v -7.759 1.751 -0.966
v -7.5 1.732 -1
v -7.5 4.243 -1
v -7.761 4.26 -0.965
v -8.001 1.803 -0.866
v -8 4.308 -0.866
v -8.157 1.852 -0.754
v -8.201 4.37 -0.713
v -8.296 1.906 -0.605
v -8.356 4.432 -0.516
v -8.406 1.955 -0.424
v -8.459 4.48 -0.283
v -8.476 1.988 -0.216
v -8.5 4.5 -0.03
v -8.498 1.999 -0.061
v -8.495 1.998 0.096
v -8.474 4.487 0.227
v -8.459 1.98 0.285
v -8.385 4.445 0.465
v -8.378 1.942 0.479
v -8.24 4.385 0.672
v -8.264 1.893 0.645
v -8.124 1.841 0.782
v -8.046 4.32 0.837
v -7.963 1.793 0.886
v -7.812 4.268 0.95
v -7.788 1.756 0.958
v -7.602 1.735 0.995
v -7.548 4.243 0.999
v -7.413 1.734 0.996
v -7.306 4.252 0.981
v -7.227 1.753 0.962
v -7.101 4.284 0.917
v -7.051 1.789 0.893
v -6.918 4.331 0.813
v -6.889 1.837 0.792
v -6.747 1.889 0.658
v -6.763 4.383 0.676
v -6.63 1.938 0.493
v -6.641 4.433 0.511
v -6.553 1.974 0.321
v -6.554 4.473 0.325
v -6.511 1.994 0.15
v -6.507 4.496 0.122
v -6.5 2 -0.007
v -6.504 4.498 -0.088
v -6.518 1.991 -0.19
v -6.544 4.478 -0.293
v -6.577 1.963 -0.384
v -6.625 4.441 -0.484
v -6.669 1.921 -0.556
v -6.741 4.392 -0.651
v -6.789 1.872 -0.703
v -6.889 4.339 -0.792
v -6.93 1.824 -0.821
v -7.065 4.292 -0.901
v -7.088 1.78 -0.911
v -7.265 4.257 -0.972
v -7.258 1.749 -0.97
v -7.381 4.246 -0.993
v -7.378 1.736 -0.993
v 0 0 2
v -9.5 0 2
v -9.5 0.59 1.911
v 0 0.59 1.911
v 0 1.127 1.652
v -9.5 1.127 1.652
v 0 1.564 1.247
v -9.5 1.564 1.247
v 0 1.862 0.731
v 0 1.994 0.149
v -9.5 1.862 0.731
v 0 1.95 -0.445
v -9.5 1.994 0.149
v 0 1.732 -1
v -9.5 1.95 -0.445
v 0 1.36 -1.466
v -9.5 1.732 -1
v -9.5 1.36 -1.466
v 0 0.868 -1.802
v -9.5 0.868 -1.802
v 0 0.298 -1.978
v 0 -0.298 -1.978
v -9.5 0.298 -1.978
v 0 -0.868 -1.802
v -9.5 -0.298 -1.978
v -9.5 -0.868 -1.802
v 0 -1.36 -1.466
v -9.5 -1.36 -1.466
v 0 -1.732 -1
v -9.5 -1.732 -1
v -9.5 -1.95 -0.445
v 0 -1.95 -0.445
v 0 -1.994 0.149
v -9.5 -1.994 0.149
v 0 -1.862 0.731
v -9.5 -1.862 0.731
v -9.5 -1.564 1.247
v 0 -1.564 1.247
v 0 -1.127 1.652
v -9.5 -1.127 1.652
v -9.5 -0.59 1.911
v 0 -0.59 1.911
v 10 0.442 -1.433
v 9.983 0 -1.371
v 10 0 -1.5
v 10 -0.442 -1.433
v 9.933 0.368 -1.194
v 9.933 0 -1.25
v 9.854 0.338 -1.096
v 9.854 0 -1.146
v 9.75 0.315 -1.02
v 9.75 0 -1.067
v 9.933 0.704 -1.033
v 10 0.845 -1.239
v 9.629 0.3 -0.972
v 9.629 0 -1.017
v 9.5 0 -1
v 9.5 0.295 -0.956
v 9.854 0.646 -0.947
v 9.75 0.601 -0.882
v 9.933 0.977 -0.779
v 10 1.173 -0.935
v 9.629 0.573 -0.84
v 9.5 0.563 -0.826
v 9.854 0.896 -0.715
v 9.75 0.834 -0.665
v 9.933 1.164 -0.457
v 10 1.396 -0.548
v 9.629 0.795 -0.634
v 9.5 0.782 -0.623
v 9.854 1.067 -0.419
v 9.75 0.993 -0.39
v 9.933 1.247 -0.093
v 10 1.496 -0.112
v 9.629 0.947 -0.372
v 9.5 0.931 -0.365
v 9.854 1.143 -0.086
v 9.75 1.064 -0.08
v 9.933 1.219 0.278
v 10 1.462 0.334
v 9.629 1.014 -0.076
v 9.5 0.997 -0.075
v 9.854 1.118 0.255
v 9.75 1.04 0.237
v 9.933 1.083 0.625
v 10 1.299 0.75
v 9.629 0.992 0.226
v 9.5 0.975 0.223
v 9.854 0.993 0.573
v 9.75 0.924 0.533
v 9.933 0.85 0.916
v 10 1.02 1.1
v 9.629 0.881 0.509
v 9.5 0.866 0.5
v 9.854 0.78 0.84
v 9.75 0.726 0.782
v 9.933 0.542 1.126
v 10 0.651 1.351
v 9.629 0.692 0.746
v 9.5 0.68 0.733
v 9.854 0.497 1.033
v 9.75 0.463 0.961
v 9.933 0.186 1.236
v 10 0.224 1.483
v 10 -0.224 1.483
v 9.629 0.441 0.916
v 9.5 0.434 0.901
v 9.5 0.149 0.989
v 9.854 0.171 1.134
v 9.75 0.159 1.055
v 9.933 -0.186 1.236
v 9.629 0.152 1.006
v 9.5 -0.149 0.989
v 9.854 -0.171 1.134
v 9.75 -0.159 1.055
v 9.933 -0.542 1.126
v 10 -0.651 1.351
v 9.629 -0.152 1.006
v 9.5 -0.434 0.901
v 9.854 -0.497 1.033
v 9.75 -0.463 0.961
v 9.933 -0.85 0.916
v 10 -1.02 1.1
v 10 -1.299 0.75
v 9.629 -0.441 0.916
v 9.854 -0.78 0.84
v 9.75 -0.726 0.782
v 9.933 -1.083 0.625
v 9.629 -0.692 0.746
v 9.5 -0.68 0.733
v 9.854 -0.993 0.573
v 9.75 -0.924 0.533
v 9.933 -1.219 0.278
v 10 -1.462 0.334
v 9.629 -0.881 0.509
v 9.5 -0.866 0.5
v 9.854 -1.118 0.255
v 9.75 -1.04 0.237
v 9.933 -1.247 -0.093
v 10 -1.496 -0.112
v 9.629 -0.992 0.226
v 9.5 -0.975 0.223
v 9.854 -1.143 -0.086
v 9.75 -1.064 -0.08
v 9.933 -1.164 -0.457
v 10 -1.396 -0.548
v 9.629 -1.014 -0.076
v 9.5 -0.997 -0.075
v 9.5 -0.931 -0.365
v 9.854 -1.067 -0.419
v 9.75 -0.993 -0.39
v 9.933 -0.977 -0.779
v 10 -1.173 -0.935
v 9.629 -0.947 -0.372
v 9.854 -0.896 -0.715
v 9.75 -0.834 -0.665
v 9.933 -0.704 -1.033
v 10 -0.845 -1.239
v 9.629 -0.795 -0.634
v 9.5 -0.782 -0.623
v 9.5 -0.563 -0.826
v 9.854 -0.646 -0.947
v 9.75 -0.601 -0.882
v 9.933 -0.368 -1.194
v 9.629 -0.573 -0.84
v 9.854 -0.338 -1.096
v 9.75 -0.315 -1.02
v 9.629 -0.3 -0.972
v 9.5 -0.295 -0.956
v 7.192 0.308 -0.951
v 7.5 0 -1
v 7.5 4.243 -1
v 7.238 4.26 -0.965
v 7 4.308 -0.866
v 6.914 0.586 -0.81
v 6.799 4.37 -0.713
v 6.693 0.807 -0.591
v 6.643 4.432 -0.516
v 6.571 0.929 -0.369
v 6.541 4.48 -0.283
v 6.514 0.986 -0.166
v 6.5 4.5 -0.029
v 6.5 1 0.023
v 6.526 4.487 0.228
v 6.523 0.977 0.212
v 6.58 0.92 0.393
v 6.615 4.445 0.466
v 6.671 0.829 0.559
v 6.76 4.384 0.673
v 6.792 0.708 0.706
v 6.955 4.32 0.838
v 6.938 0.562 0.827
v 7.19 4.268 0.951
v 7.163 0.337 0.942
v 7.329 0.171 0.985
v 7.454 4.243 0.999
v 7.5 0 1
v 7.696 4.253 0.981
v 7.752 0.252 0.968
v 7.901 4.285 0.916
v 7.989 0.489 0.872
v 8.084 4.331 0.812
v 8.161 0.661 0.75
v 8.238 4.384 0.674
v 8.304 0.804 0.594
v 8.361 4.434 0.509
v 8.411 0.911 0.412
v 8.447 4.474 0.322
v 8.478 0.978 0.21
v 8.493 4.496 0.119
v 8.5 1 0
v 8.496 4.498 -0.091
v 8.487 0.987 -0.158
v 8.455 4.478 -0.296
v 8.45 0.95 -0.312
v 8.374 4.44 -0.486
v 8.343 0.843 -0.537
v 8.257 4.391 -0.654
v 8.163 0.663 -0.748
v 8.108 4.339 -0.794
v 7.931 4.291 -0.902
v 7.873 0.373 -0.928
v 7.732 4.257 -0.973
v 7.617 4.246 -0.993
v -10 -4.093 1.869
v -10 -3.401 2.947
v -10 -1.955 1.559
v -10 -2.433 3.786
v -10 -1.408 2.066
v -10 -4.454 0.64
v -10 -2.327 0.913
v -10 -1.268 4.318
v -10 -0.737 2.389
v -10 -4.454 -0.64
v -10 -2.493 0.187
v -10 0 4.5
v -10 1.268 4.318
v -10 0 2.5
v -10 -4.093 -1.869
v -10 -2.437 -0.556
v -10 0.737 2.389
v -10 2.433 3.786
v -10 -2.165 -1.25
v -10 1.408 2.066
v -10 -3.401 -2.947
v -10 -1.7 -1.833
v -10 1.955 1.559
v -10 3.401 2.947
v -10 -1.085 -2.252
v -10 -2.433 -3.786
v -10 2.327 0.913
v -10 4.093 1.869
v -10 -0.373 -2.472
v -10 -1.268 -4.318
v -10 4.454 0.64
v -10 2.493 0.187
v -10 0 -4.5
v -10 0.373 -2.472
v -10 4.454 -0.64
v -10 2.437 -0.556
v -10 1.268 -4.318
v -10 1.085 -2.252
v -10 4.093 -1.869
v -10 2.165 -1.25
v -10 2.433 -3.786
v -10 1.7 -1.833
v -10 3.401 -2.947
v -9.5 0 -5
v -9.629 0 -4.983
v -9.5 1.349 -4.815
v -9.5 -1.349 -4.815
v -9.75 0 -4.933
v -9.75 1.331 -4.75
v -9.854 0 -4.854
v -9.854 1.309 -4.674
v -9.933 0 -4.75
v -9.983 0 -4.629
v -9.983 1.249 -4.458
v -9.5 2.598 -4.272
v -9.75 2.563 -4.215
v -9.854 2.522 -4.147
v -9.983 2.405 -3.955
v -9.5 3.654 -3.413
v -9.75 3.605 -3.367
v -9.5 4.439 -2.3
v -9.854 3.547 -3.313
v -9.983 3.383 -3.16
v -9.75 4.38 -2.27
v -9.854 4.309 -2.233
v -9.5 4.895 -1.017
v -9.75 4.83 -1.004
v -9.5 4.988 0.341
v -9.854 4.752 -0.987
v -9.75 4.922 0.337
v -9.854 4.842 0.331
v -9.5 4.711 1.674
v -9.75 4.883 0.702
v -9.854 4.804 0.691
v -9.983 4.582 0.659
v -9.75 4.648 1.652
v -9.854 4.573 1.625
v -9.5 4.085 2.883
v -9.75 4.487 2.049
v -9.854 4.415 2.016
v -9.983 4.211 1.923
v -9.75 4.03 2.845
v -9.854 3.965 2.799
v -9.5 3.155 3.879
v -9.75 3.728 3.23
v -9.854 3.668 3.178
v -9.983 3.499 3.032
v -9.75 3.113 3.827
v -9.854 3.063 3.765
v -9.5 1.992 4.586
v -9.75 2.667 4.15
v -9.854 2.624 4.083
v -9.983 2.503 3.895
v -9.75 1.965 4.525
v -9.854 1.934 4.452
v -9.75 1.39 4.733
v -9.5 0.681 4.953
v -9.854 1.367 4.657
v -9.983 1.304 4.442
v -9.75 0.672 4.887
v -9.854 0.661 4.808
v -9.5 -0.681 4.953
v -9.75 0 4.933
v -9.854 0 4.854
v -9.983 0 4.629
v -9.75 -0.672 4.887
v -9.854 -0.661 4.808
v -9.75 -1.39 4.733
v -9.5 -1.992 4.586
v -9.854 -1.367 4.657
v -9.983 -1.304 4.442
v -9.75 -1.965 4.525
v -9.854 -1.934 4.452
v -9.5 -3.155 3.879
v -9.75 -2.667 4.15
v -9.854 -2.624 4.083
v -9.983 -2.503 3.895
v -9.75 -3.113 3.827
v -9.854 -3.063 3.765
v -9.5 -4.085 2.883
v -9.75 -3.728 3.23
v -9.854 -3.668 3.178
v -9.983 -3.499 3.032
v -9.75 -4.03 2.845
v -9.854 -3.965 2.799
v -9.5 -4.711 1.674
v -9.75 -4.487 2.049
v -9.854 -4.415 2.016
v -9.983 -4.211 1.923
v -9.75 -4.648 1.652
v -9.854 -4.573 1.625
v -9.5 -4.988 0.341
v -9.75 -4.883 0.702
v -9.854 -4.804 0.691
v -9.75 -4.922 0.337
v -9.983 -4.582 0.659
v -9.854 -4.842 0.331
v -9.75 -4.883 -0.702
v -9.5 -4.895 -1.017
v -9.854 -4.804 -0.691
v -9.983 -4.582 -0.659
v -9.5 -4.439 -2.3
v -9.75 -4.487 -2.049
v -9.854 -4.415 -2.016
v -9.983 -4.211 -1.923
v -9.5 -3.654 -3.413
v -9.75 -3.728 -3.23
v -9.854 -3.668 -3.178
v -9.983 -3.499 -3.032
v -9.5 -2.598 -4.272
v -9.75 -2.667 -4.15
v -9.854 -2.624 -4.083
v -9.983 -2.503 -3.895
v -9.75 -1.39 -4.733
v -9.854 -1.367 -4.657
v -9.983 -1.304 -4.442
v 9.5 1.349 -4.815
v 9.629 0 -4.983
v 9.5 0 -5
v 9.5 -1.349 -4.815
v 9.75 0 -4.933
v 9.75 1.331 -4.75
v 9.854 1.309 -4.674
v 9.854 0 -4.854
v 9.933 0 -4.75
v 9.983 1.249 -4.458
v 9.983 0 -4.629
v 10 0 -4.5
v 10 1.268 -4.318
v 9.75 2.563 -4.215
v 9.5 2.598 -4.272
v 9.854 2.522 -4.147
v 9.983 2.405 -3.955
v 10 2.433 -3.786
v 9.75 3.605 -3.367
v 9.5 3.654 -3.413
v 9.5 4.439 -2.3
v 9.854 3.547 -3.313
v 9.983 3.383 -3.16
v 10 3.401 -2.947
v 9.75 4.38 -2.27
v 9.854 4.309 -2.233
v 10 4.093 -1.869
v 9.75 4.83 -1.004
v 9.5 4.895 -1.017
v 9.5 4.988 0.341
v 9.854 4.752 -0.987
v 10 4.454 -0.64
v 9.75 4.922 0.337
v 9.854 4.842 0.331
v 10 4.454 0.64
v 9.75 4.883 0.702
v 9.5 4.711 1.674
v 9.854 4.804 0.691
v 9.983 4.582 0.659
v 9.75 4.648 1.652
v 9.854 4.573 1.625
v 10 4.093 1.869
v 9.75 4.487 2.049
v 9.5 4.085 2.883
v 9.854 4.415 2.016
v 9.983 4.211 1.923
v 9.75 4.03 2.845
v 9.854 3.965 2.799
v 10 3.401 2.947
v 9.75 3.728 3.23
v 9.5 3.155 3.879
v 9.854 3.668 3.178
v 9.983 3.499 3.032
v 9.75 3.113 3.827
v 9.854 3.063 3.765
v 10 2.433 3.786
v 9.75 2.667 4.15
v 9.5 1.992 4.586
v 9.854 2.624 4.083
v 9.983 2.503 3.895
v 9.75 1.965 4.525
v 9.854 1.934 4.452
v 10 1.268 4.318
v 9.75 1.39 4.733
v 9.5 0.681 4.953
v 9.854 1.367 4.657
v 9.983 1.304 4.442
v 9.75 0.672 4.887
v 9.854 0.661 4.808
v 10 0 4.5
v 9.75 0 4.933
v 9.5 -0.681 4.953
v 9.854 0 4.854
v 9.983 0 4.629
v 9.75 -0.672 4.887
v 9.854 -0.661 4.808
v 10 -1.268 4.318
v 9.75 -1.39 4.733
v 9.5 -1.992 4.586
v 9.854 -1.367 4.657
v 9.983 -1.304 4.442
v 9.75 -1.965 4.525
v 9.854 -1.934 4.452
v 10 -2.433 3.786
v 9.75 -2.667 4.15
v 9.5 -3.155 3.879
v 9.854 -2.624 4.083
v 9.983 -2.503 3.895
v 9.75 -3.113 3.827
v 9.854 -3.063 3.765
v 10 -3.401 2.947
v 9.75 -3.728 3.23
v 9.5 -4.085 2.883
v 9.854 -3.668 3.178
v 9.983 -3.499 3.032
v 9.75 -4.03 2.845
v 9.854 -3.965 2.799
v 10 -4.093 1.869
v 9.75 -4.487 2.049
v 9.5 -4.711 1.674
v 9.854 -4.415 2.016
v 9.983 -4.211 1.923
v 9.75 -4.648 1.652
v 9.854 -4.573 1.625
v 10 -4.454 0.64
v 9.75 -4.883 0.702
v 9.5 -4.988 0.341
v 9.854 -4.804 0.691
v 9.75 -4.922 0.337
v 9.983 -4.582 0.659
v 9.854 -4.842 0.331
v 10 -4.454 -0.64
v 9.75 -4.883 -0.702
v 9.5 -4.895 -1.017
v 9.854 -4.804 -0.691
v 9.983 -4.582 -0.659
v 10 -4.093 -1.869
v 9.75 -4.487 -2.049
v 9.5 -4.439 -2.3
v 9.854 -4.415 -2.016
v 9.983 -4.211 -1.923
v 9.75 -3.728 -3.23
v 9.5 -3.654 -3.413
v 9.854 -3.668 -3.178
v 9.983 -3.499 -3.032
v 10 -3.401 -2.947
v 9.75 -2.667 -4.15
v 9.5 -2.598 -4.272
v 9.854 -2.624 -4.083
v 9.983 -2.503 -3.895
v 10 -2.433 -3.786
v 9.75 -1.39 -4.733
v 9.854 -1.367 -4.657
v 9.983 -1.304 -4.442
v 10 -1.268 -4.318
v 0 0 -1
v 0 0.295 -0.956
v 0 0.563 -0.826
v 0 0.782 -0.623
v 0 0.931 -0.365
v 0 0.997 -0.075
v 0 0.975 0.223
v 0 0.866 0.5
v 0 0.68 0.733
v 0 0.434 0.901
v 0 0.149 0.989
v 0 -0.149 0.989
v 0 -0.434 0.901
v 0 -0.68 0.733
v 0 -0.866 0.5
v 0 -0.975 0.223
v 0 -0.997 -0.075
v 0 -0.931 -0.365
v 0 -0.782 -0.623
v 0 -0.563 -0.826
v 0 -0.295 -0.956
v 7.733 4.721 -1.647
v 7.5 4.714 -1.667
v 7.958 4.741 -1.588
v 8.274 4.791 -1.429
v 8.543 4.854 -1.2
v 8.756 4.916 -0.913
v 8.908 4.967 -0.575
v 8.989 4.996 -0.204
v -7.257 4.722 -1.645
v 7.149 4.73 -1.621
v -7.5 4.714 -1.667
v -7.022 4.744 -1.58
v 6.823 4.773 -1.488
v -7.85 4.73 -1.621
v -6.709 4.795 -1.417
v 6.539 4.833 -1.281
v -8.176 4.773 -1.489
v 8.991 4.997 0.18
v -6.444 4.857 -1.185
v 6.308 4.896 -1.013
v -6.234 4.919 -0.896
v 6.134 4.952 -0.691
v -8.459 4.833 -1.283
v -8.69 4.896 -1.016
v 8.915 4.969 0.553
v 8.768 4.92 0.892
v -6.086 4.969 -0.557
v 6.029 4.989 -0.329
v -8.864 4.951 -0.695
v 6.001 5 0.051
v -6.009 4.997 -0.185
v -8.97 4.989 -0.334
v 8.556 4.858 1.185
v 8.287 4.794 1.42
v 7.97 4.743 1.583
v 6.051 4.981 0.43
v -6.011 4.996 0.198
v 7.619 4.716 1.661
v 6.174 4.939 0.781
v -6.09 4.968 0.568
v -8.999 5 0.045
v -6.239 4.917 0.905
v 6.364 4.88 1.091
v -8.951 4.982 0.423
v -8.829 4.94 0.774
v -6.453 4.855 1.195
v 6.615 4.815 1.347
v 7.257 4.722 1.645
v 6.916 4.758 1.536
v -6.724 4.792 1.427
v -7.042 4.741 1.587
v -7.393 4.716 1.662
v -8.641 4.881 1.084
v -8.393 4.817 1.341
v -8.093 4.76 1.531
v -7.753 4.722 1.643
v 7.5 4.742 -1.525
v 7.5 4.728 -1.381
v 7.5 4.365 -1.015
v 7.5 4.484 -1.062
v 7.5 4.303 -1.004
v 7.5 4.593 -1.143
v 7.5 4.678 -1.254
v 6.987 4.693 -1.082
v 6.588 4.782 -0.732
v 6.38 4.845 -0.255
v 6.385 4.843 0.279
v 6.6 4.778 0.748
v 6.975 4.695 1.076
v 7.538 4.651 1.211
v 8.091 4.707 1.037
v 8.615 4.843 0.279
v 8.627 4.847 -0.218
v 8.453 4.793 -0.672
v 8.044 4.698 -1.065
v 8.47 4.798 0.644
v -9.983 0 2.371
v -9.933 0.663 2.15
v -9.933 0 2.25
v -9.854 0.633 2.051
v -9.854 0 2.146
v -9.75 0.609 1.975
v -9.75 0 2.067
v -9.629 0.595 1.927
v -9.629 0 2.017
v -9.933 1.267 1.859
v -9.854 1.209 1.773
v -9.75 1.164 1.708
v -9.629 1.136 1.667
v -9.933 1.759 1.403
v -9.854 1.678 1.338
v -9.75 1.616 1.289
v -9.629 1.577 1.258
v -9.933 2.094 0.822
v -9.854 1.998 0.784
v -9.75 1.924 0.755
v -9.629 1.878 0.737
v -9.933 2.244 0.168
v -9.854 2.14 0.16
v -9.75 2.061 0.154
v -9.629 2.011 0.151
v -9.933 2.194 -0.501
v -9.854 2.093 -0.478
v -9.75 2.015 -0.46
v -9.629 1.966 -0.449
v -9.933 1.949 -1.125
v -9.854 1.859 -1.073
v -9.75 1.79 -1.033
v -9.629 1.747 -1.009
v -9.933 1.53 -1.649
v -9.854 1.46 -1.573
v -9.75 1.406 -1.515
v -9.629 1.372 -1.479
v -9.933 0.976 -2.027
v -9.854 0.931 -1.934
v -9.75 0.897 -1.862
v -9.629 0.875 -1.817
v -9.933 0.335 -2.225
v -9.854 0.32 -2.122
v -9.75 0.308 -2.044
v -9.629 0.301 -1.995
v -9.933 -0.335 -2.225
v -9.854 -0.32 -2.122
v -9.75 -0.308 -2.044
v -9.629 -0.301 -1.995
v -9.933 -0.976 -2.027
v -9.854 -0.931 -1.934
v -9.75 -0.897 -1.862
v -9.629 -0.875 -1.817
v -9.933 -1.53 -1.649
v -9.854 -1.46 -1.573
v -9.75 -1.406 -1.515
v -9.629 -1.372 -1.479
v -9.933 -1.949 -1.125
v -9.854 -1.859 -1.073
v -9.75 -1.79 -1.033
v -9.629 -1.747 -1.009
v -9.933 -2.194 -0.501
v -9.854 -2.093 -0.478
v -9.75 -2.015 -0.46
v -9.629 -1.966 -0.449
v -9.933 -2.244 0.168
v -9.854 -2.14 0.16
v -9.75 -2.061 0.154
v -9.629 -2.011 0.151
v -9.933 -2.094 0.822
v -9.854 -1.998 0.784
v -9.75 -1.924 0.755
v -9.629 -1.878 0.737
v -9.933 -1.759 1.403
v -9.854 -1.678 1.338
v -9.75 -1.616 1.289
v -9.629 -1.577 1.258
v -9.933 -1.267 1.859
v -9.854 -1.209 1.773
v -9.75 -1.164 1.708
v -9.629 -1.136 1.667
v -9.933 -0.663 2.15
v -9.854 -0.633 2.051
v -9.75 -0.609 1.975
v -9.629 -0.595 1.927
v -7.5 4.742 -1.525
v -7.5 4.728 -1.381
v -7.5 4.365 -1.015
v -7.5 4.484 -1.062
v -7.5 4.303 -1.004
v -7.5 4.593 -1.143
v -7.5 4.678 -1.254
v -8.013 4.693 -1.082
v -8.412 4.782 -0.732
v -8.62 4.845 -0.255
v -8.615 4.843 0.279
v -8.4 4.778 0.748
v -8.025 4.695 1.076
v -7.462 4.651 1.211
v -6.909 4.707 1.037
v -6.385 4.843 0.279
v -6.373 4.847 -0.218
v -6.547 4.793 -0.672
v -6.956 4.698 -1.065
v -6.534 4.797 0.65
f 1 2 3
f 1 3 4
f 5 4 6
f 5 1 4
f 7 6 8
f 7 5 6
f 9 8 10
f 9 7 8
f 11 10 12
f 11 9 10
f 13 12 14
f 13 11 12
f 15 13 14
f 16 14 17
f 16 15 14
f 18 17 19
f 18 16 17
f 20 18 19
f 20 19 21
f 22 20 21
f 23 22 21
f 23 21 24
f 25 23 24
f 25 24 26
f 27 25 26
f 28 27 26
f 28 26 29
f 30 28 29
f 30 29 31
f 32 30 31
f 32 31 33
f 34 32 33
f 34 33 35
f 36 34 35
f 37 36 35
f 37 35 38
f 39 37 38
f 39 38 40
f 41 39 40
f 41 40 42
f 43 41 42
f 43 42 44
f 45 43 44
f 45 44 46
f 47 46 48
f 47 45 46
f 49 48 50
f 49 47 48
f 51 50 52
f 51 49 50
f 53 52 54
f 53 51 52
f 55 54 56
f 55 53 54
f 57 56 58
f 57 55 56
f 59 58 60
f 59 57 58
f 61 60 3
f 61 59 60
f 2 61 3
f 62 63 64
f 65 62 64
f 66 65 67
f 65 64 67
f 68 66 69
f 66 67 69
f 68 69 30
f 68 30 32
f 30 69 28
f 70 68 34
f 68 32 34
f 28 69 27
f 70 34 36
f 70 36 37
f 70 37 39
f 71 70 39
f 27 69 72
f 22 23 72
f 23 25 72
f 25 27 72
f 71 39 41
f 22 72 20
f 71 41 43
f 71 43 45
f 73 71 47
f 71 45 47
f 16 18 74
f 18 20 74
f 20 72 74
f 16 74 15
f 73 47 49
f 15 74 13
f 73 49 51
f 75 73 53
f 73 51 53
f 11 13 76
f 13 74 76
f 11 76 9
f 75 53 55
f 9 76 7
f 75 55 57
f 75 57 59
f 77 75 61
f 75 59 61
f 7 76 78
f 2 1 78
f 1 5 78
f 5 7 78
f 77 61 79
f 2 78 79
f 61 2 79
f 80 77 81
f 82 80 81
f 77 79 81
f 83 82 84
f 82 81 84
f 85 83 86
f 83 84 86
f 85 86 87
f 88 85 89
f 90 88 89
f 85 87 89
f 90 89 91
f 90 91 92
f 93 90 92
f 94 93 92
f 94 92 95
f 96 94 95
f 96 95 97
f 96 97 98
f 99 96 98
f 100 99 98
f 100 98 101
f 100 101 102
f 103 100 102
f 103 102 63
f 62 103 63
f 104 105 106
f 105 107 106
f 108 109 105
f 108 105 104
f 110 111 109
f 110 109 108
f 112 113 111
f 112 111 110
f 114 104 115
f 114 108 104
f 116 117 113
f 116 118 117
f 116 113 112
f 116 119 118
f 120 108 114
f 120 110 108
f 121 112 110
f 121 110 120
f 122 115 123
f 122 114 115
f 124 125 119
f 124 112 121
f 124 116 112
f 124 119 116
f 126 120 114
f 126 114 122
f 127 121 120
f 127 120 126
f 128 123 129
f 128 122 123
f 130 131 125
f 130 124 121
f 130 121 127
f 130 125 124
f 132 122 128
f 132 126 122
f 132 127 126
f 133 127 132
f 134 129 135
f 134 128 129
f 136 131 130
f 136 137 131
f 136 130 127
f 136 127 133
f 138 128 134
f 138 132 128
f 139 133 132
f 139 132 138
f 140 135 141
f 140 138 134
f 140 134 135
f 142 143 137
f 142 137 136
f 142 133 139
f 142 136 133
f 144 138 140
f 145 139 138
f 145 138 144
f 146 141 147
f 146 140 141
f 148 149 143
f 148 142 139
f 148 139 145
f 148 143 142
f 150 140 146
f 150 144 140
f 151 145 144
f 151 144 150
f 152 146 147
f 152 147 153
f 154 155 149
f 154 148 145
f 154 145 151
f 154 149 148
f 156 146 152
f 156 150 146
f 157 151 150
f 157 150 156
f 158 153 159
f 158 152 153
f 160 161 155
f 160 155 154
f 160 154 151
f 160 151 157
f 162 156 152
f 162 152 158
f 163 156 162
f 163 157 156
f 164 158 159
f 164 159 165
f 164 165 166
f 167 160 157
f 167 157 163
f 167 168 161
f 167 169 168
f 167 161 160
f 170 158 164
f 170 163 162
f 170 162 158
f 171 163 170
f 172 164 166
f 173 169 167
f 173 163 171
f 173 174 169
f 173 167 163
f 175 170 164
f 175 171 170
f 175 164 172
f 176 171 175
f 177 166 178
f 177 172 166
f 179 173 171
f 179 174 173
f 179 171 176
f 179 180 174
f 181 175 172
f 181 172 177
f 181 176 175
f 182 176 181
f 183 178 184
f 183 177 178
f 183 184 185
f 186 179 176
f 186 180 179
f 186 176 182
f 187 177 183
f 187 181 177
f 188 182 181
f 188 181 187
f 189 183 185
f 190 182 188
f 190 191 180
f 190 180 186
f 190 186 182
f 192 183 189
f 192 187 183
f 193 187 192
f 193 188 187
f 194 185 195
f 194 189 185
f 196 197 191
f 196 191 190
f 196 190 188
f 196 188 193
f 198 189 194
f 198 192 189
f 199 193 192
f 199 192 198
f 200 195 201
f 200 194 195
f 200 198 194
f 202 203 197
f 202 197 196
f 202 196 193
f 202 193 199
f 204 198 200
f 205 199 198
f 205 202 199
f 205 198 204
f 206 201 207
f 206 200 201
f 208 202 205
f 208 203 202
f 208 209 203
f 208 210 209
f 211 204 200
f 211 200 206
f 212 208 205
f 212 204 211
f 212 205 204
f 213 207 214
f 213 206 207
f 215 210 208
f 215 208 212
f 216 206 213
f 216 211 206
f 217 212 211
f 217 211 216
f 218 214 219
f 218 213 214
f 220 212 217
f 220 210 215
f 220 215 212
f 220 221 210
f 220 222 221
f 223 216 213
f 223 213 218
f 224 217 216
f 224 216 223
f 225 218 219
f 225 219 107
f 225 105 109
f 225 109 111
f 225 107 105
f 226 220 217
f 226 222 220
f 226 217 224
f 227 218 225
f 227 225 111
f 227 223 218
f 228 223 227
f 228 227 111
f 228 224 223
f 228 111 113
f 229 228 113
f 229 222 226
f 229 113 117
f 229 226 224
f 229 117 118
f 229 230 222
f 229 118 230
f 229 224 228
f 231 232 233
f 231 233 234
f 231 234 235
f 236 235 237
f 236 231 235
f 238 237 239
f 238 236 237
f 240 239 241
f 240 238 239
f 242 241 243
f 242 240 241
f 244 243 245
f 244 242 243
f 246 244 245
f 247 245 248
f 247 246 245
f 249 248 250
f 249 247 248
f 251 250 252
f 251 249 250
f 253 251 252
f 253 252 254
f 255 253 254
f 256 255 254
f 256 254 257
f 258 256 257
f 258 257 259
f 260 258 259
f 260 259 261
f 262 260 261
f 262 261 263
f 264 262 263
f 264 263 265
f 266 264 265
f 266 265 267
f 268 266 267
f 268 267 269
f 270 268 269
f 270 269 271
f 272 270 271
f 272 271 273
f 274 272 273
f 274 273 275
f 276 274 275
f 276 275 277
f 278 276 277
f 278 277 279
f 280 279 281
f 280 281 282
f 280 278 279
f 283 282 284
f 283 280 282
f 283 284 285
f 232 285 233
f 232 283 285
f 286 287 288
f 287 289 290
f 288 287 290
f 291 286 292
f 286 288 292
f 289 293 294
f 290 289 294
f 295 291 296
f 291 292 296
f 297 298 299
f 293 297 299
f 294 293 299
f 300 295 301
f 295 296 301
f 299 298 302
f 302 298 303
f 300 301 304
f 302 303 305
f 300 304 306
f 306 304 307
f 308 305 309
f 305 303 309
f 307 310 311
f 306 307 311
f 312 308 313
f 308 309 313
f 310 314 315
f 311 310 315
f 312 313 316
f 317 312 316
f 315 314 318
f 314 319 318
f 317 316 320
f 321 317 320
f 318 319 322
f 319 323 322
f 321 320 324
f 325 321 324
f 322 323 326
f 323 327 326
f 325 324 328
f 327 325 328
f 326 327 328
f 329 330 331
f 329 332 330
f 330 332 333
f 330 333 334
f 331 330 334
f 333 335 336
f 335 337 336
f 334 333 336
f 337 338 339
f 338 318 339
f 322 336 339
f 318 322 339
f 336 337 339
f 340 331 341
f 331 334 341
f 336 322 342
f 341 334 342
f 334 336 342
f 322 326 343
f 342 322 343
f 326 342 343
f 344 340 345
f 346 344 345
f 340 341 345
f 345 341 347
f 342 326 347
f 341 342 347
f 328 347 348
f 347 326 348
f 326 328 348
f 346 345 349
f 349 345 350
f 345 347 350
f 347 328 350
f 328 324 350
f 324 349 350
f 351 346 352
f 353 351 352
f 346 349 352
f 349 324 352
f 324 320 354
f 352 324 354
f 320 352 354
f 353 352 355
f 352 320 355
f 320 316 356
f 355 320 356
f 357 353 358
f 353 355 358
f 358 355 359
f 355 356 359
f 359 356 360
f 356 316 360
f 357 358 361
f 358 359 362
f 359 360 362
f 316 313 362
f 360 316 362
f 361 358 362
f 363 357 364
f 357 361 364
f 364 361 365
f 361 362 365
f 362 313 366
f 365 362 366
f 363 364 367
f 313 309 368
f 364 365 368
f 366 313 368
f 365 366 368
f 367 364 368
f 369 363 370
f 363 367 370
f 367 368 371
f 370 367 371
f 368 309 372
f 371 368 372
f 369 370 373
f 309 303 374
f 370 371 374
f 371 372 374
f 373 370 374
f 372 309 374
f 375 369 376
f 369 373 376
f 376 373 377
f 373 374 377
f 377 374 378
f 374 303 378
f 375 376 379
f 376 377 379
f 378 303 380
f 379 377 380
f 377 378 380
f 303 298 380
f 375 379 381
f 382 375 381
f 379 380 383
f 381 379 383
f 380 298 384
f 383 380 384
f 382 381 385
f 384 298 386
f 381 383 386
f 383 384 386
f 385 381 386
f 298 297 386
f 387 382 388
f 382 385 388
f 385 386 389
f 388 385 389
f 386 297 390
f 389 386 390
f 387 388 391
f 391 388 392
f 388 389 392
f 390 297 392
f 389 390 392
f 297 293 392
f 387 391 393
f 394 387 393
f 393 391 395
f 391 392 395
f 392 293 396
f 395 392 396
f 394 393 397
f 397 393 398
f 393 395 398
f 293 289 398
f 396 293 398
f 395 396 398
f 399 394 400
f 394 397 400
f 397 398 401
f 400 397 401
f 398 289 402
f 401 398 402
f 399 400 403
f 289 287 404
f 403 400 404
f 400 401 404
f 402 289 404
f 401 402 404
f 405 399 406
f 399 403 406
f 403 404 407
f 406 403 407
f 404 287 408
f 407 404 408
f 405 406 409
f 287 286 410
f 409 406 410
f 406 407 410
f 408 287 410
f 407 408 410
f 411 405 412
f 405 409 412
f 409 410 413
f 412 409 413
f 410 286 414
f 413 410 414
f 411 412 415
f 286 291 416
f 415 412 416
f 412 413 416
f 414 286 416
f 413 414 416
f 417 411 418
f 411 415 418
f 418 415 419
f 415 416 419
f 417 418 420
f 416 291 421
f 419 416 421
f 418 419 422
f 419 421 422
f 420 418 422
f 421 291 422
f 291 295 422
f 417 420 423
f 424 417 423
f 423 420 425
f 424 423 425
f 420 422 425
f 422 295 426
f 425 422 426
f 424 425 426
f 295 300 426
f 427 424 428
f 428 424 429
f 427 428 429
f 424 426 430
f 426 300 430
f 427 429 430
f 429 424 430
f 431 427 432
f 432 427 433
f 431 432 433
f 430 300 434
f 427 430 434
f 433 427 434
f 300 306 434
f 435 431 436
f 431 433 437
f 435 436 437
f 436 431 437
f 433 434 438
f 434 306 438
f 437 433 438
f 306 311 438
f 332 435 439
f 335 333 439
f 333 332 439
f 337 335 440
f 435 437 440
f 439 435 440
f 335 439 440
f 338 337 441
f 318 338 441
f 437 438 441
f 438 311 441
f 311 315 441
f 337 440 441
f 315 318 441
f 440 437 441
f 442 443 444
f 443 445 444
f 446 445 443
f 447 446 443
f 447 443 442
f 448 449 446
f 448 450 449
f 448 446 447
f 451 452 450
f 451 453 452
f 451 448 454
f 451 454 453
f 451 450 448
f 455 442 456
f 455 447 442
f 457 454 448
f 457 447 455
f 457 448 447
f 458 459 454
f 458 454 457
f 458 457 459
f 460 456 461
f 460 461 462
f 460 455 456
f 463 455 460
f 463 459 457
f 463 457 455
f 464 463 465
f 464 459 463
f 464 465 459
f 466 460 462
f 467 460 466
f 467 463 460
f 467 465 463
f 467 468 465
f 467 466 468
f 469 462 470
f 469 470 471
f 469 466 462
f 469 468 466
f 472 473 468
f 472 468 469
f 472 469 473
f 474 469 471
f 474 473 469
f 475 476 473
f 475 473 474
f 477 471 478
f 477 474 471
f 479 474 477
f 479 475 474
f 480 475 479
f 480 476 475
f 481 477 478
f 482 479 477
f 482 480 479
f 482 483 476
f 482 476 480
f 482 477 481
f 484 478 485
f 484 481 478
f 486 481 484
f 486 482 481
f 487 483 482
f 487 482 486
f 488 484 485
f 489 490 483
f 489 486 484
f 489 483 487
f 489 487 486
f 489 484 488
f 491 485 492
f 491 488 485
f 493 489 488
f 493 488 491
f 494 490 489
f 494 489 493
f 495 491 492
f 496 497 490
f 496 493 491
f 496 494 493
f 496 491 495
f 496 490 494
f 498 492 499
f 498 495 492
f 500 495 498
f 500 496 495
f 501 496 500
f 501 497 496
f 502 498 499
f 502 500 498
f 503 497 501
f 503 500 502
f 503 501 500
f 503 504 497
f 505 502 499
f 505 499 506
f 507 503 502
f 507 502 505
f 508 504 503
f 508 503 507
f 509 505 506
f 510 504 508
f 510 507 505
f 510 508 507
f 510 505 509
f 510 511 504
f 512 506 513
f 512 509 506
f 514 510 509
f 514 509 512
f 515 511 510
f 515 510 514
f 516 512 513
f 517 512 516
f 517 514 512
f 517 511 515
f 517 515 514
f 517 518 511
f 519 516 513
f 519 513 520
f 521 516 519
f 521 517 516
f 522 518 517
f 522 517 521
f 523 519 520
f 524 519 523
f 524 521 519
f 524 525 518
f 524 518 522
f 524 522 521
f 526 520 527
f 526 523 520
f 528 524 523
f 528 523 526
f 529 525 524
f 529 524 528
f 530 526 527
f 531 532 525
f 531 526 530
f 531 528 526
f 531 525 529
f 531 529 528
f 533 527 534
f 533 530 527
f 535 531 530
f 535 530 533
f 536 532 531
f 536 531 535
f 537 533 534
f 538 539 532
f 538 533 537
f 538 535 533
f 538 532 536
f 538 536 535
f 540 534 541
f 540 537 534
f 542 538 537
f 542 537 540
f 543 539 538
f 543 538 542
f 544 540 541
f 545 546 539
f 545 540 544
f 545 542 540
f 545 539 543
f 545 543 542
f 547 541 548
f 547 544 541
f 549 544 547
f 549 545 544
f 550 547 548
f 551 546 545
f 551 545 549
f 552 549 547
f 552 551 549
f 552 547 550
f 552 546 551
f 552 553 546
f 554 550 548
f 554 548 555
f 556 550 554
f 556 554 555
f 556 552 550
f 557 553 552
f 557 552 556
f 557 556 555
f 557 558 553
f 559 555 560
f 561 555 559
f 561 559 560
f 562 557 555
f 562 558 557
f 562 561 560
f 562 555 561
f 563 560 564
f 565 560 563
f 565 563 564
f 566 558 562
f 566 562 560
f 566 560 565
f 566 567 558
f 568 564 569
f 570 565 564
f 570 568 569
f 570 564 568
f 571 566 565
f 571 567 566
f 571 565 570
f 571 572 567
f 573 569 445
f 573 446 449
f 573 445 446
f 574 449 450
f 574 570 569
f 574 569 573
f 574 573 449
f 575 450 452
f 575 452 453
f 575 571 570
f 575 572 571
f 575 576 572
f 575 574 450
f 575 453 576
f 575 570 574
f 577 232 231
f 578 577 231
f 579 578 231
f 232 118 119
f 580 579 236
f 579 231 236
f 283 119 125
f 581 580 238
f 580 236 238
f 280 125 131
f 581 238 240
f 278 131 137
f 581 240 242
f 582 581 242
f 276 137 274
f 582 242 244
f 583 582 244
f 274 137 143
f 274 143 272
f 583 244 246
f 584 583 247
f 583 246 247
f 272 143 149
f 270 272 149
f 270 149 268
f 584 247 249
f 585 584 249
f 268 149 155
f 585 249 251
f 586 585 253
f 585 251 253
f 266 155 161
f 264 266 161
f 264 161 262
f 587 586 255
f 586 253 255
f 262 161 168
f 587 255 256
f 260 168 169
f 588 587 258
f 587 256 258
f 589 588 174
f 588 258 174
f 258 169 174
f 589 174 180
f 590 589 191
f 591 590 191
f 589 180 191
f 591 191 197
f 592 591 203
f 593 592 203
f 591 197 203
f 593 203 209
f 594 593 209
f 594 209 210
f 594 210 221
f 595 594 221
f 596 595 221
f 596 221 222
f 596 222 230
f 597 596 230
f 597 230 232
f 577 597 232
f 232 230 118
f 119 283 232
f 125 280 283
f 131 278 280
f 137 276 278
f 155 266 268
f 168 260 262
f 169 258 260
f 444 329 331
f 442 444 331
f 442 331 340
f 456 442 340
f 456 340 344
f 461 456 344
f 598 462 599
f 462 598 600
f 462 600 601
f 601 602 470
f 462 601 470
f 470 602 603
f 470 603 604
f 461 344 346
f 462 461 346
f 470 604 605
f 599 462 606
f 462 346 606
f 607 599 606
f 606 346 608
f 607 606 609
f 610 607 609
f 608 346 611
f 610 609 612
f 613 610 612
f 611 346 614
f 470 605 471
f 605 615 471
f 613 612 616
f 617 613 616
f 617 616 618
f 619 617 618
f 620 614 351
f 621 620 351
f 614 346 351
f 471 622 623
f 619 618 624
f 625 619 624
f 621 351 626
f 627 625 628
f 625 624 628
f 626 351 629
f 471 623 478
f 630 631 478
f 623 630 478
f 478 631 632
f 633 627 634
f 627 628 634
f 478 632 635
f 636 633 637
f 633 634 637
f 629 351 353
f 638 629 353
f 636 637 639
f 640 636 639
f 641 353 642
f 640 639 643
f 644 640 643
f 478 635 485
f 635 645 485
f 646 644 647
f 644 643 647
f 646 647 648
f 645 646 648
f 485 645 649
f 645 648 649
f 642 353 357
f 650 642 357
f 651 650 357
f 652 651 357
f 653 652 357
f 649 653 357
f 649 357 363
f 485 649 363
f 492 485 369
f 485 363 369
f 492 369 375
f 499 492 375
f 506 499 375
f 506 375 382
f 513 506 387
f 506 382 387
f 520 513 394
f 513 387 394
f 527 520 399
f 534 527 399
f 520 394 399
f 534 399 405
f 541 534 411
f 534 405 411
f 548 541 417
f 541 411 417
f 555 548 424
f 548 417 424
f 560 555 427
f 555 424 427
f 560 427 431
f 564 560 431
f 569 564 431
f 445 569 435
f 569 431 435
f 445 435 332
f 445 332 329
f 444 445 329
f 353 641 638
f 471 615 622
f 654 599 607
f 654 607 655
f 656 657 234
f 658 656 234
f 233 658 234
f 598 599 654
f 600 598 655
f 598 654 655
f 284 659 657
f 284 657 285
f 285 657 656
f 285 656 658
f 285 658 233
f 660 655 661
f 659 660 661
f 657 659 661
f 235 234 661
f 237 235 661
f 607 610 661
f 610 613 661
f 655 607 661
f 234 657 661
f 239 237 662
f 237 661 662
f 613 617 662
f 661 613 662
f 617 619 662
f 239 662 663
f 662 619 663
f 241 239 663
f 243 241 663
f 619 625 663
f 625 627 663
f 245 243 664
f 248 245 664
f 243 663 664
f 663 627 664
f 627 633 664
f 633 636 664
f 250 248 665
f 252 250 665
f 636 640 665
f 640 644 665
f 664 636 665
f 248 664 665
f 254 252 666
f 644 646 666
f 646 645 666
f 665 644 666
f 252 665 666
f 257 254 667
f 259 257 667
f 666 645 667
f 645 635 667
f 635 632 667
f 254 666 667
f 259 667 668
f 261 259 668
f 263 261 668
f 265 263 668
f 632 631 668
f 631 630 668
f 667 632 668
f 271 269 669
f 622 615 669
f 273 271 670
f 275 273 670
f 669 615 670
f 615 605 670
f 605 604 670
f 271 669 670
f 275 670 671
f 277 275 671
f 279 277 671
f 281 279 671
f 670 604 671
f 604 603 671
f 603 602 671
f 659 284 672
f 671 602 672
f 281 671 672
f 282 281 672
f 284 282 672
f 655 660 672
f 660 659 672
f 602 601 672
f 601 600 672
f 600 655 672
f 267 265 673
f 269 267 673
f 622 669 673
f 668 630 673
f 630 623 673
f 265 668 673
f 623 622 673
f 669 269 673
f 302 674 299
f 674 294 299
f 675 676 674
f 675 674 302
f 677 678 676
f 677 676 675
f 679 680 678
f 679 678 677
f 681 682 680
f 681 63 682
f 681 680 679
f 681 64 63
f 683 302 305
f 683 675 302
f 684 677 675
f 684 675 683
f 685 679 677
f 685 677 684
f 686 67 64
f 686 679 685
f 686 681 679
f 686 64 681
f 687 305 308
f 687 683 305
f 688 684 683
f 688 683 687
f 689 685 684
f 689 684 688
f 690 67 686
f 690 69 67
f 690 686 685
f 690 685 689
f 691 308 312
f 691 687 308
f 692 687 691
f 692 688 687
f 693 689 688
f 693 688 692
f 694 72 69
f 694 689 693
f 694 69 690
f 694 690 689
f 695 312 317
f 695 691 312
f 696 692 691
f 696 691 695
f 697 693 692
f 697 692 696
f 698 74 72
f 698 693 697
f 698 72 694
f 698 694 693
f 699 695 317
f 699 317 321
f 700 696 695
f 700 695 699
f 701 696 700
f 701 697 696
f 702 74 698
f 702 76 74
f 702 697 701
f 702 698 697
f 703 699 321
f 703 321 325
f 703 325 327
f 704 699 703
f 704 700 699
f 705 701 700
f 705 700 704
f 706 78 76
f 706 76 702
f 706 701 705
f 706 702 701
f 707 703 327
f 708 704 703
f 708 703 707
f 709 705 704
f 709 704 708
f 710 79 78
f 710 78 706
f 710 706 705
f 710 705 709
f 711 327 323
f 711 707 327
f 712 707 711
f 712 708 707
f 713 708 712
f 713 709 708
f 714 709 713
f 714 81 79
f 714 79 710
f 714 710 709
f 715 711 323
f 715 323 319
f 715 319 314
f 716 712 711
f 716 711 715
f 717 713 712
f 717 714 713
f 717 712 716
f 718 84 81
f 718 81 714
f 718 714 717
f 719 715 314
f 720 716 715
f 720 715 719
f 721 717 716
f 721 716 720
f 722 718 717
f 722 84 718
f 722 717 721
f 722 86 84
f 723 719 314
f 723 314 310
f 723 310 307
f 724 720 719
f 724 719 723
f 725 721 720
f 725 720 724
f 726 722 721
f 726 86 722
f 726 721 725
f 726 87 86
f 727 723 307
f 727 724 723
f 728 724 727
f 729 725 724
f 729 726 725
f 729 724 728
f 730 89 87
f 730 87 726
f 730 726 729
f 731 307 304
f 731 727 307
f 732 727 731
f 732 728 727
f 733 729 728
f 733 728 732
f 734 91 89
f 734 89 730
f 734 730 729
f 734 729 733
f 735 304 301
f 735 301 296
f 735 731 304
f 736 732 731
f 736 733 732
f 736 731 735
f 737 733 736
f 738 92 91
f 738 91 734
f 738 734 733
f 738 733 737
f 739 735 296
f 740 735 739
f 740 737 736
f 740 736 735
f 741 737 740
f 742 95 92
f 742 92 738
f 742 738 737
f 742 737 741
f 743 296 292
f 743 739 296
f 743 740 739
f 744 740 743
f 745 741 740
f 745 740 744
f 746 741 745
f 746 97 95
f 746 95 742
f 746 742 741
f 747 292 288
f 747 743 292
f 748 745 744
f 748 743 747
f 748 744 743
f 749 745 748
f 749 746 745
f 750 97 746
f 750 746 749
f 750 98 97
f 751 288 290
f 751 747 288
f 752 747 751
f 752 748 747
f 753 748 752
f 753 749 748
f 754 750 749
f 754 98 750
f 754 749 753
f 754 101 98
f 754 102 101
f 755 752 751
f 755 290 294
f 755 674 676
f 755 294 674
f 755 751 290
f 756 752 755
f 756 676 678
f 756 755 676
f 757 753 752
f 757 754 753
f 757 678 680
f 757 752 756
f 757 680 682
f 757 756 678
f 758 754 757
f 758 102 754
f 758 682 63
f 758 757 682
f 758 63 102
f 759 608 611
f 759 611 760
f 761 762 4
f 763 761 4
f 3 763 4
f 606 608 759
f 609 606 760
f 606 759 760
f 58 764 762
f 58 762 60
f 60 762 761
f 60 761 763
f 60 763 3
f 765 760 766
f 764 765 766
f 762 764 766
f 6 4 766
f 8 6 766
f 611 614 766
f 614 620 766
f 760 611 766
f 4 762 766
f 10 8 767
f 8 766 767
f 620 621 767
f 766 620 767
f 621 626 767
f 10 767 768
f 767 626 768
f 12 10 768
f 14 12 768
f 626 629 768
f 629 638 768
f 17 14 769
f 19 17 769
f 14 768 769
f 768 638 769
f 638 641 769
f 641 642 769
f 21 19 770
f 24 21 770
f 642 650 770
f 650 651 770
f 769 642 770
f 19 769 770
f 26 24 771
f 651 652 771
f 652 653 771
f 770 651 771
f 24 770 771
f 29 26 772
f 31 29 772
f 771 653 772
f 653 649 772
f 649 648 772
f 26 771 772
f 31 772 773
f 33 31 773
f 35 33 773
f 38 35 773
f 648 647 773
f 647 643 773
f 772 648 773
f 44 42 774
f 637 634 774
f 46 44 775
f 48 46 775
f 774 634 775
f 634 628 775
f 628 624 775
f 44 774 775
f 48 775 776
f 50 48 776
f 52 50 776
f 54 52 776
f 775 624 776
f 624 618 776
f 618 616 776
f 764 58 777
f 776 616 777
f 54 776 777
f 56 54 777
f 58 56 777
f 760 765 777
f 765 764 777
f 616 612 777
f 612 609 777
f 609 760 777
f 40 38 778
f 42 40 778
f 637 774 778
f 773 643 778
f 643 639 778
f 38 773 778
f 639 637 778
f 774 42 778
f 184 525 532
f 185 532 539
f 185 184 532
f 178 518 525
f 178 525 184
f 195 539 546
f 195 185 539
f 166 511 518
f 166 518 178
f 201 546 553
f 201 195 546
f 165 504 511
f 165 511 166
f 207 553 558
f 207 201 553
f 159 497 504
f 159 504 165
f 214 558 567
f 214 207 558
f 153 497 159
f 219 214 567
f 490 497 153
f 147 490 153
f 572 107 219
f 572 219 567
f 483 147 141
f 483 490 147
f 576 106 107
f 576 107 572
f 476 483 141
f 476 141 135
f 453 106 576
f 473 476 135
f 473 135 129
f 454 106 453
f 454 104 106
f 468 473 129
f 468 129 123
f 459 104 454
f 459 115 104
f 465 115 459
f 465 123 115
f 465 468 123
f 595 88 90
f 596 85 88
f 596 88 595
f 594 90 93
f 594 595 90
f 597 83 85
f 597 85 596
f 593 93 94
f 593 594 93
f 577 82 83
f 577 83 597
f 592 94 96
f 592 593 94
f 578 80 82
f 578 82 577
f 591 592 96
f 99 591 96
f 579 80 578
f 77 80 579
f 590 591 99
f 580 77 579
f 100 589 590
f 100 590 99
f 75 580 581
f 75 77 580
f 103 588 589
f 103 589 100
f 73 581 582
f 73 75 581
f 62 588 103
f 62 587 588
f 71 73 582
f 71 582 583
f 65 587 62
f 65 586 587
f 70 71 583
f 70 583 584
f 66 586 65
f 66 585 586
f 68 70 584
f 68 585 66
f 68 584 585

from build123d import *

# Parameters (mm, degrees)
BOSS_EXTRUDE1_DEPTH      = 10
BOSS_EXTRUDE1_DEPTH_BACK = 10
SKETCH1_R                = 5
SKETCH2_R                = 1
CUT_EXTRUDE1_DEPTH       = 10
SKETCH3_R                = 2
CUT_EXTRUDE2_DEPTH       = 10
CUT_EXTRUDE4_REACH       = 14.247
CUT_EXTRUDE4_END_RADIUS  = 5
SKETCH4_R                = 1
FILLET1_R                = 0.5
FILLET2_R                = 0.5


with BuildPart() as part:
    # Sketch1 → Boss-Extrude1 (new, two sides: drawn at the far end of the back side and taken through both)
    with BuildSketch(Plane(origin=(0, 0, 0), x_dir=(0, 0, -1), z_dir=(1, 0, 0)).offset(-BOSS_EXTRUDE1_DEPTH_BACK)):
        Circle(SKETCH1_R)
    extrude(amount=BOSS_EXTRUDE1_DEPTH + BOSS_EXTRUDE1_DEPTH_BACK)

    # Sketch2 → Cut-Extrude1 (cut)
    with BuildSketch(Plane(origin=(10, 0, 0), x_dir=(0, 0, -1), z_dir=(1, 0, 0))):
        Circle(SKETCH2_R)
    extrude(amount=-CUT_EXTRUDE1_DEPTH, mode=Mode.SUBTRACT)

    # Sketch3 → Cut-Extrude2 (cut)
    with BuildSketch(Plane.ZY.offset(10)):
        Circle(SKETCH3_R)
    extrude(amount=-CUT_EXTRUDE2_DEPTH, mode=Mode.SUBTRACT)

    # Cut-Extrude4: up to this cylinder (the profile starts inside it)
    cut_extrude4_end = Plane(origin=(0, 0, 0), z_dir=(1, 0, 0)) * Cylinder(CUT_EXTRUDE4_END_RADIUS, 54.494, mode=Mode.PRIVATE)
    # Sketch4 → Cut-Extrude4 (cut, up to the surface)
    with BuildSketch(Plane(origin=(0, 0, 0), x_dir=(1, 0, 0), z_dir=(0, 1, 0)), mode=Mode.PRIVATE) as cut_extrude4_sk1:
        with Locations(Location((-7.5, 0, 0), (0, 0, 90))):
            Circle(SKETCH4_R)
    cut_extrude4_tool1 = extrude(cut_extrude4_sk1.sketch, amount=CUT_EXTRUDE4_REACH, mode=Mode.PRIVATE) & cut_extrude4_end
    add(cut_extrude4_tool1.solids().sort_by_distance((-7.5, 0, 0))[0], mode=Mode.SUBTRACT)
    # Sketch4 → Cut-Extrude4 (cut, up to the surface)
    with BuildSketch(Plane(origin=(0, 0, 0), x_dir=(1, 0, 0), z_dir=(0, 1, 0)), mode=Mode.PRIVATE) as cut_extrude4_sk2:
        with Locations(Location((7.5, 0, 0), (0, 0, 90))):
            Circle(SKETCH4_R)
    cut_extrude4_tool2 = extrude(cut_extrude4_sk2.sketch, amount=CUT_EXTRUDE4_REACH, mode=Mode.PRIVATE) & cut_extrude4_end
    add(cut_extrude4_tool2.solids().sort_by_distance((7.5, 0, 0))[0], mode=Mode.SUBTRACT)

    # Fillet1
    fillet1_edges = [part.edges().sort_by_distance(p)[0] for p in [
        (-10, 0, -2),
        (-10, 0, 5),
        (10, 0, 5),
        (10, 0, 1),
    ]]
    fillet(fillet1_edges, radius=FILLET1_R)

    # Fillet2
    fillet2_edges = [part.edges().sort_by_distance(p)[0] for p in [
        (-7.5, 4.898979486, 1),
        (7.5, 4.898979486, 1),
    ]]
    fillet(fillet2_edges, radius=FILLET2_R)


solid = part.part
